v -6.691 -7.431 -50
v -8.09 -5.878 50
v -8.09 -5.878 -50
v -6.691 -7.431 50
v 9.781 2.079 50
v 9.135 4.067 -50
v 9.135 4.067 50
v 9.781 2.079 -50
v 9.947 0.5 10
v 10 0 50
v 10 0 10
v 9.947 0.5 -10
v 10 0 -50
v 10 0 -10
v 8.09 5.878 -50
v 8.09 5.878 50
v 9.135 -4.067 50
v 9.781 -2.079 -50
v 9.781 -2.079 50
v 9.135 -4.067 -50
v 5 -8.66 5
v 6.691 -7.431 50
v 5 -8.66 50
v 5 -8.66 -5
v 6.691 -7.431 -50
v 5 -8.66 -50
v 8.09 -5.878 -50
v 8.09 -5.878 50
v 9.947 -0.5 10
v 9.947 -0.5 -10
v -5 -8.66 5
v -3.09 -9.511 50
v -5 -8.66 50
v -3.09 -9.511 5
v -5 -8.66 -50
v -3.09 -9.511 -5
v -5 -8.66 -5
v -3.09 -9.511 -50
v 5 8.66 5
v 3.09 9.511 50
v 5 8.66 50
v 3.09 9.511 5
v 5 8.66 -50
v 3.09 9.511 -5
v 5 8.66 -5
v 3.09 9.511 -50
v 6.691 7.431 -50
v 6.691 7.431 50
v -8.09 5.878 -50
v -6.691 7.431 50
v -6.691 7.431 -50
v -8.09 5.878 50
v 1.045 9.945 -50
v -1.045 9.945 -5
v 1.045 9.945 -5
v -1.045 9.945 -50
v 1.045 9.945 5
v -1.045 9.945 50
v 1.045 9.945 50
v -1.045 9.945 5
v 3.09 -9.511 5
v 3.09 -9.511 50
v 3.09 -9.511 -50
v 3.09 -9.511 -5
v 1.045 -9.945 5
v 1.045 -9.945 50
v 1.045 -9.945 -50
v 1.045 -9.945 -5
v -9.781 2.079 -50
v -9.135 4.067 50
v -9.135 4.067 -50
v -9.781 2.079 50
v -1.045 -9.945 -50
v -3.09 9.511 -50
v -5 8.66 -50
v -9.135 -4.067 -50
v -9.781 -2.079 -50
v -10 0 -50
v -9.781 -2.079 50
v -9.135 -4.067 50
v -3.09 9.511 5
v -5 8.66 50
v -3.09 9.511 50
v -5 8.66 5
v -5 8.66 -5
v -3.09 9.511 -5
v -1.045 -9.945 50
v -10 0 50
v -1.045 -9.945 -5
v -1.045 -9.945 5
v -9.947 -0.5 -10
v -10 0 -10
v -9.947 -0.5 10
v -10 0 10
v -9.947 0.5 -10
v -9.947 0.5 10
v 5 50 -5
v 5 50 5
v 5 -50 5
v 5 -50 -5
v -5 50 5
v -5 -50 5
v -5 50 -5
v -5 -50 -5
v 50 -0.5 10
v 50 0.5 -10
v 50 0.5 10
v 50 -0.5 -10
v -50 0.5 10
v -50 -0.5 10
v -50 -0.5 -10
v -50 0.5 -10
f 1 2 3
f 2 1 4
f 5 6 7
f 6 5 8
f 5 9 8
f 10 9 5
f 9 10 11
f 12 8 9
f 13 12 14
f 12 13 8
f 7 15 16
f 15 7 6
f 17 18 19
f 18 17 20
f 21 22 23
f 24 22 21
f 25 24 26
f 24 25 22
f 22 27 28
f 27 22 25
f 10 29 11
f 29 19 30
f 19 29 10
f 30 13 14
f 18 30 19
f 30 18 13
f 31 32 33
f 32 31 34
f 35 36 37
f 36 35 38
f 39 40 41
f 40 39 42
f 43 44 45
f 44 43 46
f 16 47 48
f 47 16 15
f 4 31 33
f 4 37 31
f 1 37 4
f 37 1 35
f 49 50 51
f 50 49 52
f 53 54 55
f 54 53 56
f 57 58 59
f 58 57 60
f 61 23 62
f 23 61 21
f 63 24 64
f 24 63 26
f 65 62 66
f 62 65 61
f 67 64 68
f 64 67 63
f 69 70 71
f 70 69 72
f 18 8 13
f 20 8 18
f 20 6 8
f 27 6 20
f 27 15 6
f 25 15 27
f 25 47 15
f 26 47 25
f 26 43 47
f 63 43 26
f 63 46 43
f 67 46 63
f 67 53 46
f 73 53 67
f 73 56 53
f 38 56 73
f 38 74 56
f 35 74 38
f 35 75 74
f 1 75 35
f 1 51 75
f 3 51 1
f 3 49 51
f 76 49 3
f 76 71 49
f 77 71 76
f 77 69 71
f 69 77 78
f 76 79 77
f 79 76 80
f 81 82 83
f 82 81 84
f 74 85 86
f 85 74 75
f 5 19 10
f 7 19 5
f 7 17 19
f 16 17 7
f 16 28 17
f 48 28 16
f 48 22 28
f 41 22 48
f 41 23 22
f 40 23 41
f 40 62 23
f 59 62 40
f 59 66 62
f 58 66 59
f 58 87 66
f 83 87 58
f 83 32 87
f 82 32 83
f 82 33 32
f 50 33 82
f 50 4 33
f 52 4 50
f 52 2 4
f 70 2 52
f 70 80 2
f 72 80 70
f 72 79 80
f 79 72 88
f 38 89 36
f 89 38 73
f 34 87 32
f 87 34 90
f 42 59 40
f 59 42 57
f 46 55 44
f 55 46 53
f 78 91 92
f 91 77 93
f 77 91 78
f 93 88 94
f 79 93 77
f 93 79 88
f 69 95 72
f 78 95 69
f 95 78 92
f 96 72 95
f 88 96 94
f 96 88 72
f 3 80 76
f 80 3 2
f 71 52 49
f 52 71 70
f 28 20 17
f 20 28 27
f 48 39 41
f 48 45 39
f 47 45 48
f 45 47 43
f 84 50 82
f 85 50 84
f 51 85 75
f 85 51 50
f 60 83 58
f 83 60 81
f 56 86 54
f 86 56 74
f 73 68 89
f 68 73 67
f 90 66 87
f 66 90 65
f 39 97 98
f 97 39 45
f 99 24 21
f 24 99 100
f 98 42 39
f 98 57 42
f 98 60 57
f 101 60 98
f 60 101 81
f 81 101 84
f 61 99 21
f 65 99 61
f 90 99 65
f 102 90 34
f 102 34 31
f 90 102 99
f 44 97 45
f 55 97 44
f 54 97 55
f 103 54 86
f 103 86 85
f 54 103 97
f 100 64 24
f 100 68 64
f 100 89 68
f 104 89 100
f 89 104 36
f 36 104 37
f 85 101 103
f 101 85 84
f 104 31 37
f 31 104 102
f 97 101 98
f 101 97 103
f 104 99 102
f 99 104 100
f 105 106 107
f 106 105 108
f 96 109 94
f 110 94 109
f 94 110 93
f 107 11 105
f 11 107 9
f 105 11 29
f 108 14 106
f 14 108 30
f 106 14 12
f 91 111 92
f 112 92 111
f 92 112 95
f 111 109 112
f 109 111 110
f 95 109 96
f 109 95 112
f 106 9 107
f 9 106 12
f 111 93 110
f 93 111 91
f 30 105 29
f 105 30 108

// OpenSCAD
color([1, 0, 0, .5]) cylinder(r = 10, h = 100, center = true);
color([0, 0, 1, .5]) cube([10, 100, 10], center = true);
color([0, 1, 0, .5]) cube([100, 1, 20], center = true);
